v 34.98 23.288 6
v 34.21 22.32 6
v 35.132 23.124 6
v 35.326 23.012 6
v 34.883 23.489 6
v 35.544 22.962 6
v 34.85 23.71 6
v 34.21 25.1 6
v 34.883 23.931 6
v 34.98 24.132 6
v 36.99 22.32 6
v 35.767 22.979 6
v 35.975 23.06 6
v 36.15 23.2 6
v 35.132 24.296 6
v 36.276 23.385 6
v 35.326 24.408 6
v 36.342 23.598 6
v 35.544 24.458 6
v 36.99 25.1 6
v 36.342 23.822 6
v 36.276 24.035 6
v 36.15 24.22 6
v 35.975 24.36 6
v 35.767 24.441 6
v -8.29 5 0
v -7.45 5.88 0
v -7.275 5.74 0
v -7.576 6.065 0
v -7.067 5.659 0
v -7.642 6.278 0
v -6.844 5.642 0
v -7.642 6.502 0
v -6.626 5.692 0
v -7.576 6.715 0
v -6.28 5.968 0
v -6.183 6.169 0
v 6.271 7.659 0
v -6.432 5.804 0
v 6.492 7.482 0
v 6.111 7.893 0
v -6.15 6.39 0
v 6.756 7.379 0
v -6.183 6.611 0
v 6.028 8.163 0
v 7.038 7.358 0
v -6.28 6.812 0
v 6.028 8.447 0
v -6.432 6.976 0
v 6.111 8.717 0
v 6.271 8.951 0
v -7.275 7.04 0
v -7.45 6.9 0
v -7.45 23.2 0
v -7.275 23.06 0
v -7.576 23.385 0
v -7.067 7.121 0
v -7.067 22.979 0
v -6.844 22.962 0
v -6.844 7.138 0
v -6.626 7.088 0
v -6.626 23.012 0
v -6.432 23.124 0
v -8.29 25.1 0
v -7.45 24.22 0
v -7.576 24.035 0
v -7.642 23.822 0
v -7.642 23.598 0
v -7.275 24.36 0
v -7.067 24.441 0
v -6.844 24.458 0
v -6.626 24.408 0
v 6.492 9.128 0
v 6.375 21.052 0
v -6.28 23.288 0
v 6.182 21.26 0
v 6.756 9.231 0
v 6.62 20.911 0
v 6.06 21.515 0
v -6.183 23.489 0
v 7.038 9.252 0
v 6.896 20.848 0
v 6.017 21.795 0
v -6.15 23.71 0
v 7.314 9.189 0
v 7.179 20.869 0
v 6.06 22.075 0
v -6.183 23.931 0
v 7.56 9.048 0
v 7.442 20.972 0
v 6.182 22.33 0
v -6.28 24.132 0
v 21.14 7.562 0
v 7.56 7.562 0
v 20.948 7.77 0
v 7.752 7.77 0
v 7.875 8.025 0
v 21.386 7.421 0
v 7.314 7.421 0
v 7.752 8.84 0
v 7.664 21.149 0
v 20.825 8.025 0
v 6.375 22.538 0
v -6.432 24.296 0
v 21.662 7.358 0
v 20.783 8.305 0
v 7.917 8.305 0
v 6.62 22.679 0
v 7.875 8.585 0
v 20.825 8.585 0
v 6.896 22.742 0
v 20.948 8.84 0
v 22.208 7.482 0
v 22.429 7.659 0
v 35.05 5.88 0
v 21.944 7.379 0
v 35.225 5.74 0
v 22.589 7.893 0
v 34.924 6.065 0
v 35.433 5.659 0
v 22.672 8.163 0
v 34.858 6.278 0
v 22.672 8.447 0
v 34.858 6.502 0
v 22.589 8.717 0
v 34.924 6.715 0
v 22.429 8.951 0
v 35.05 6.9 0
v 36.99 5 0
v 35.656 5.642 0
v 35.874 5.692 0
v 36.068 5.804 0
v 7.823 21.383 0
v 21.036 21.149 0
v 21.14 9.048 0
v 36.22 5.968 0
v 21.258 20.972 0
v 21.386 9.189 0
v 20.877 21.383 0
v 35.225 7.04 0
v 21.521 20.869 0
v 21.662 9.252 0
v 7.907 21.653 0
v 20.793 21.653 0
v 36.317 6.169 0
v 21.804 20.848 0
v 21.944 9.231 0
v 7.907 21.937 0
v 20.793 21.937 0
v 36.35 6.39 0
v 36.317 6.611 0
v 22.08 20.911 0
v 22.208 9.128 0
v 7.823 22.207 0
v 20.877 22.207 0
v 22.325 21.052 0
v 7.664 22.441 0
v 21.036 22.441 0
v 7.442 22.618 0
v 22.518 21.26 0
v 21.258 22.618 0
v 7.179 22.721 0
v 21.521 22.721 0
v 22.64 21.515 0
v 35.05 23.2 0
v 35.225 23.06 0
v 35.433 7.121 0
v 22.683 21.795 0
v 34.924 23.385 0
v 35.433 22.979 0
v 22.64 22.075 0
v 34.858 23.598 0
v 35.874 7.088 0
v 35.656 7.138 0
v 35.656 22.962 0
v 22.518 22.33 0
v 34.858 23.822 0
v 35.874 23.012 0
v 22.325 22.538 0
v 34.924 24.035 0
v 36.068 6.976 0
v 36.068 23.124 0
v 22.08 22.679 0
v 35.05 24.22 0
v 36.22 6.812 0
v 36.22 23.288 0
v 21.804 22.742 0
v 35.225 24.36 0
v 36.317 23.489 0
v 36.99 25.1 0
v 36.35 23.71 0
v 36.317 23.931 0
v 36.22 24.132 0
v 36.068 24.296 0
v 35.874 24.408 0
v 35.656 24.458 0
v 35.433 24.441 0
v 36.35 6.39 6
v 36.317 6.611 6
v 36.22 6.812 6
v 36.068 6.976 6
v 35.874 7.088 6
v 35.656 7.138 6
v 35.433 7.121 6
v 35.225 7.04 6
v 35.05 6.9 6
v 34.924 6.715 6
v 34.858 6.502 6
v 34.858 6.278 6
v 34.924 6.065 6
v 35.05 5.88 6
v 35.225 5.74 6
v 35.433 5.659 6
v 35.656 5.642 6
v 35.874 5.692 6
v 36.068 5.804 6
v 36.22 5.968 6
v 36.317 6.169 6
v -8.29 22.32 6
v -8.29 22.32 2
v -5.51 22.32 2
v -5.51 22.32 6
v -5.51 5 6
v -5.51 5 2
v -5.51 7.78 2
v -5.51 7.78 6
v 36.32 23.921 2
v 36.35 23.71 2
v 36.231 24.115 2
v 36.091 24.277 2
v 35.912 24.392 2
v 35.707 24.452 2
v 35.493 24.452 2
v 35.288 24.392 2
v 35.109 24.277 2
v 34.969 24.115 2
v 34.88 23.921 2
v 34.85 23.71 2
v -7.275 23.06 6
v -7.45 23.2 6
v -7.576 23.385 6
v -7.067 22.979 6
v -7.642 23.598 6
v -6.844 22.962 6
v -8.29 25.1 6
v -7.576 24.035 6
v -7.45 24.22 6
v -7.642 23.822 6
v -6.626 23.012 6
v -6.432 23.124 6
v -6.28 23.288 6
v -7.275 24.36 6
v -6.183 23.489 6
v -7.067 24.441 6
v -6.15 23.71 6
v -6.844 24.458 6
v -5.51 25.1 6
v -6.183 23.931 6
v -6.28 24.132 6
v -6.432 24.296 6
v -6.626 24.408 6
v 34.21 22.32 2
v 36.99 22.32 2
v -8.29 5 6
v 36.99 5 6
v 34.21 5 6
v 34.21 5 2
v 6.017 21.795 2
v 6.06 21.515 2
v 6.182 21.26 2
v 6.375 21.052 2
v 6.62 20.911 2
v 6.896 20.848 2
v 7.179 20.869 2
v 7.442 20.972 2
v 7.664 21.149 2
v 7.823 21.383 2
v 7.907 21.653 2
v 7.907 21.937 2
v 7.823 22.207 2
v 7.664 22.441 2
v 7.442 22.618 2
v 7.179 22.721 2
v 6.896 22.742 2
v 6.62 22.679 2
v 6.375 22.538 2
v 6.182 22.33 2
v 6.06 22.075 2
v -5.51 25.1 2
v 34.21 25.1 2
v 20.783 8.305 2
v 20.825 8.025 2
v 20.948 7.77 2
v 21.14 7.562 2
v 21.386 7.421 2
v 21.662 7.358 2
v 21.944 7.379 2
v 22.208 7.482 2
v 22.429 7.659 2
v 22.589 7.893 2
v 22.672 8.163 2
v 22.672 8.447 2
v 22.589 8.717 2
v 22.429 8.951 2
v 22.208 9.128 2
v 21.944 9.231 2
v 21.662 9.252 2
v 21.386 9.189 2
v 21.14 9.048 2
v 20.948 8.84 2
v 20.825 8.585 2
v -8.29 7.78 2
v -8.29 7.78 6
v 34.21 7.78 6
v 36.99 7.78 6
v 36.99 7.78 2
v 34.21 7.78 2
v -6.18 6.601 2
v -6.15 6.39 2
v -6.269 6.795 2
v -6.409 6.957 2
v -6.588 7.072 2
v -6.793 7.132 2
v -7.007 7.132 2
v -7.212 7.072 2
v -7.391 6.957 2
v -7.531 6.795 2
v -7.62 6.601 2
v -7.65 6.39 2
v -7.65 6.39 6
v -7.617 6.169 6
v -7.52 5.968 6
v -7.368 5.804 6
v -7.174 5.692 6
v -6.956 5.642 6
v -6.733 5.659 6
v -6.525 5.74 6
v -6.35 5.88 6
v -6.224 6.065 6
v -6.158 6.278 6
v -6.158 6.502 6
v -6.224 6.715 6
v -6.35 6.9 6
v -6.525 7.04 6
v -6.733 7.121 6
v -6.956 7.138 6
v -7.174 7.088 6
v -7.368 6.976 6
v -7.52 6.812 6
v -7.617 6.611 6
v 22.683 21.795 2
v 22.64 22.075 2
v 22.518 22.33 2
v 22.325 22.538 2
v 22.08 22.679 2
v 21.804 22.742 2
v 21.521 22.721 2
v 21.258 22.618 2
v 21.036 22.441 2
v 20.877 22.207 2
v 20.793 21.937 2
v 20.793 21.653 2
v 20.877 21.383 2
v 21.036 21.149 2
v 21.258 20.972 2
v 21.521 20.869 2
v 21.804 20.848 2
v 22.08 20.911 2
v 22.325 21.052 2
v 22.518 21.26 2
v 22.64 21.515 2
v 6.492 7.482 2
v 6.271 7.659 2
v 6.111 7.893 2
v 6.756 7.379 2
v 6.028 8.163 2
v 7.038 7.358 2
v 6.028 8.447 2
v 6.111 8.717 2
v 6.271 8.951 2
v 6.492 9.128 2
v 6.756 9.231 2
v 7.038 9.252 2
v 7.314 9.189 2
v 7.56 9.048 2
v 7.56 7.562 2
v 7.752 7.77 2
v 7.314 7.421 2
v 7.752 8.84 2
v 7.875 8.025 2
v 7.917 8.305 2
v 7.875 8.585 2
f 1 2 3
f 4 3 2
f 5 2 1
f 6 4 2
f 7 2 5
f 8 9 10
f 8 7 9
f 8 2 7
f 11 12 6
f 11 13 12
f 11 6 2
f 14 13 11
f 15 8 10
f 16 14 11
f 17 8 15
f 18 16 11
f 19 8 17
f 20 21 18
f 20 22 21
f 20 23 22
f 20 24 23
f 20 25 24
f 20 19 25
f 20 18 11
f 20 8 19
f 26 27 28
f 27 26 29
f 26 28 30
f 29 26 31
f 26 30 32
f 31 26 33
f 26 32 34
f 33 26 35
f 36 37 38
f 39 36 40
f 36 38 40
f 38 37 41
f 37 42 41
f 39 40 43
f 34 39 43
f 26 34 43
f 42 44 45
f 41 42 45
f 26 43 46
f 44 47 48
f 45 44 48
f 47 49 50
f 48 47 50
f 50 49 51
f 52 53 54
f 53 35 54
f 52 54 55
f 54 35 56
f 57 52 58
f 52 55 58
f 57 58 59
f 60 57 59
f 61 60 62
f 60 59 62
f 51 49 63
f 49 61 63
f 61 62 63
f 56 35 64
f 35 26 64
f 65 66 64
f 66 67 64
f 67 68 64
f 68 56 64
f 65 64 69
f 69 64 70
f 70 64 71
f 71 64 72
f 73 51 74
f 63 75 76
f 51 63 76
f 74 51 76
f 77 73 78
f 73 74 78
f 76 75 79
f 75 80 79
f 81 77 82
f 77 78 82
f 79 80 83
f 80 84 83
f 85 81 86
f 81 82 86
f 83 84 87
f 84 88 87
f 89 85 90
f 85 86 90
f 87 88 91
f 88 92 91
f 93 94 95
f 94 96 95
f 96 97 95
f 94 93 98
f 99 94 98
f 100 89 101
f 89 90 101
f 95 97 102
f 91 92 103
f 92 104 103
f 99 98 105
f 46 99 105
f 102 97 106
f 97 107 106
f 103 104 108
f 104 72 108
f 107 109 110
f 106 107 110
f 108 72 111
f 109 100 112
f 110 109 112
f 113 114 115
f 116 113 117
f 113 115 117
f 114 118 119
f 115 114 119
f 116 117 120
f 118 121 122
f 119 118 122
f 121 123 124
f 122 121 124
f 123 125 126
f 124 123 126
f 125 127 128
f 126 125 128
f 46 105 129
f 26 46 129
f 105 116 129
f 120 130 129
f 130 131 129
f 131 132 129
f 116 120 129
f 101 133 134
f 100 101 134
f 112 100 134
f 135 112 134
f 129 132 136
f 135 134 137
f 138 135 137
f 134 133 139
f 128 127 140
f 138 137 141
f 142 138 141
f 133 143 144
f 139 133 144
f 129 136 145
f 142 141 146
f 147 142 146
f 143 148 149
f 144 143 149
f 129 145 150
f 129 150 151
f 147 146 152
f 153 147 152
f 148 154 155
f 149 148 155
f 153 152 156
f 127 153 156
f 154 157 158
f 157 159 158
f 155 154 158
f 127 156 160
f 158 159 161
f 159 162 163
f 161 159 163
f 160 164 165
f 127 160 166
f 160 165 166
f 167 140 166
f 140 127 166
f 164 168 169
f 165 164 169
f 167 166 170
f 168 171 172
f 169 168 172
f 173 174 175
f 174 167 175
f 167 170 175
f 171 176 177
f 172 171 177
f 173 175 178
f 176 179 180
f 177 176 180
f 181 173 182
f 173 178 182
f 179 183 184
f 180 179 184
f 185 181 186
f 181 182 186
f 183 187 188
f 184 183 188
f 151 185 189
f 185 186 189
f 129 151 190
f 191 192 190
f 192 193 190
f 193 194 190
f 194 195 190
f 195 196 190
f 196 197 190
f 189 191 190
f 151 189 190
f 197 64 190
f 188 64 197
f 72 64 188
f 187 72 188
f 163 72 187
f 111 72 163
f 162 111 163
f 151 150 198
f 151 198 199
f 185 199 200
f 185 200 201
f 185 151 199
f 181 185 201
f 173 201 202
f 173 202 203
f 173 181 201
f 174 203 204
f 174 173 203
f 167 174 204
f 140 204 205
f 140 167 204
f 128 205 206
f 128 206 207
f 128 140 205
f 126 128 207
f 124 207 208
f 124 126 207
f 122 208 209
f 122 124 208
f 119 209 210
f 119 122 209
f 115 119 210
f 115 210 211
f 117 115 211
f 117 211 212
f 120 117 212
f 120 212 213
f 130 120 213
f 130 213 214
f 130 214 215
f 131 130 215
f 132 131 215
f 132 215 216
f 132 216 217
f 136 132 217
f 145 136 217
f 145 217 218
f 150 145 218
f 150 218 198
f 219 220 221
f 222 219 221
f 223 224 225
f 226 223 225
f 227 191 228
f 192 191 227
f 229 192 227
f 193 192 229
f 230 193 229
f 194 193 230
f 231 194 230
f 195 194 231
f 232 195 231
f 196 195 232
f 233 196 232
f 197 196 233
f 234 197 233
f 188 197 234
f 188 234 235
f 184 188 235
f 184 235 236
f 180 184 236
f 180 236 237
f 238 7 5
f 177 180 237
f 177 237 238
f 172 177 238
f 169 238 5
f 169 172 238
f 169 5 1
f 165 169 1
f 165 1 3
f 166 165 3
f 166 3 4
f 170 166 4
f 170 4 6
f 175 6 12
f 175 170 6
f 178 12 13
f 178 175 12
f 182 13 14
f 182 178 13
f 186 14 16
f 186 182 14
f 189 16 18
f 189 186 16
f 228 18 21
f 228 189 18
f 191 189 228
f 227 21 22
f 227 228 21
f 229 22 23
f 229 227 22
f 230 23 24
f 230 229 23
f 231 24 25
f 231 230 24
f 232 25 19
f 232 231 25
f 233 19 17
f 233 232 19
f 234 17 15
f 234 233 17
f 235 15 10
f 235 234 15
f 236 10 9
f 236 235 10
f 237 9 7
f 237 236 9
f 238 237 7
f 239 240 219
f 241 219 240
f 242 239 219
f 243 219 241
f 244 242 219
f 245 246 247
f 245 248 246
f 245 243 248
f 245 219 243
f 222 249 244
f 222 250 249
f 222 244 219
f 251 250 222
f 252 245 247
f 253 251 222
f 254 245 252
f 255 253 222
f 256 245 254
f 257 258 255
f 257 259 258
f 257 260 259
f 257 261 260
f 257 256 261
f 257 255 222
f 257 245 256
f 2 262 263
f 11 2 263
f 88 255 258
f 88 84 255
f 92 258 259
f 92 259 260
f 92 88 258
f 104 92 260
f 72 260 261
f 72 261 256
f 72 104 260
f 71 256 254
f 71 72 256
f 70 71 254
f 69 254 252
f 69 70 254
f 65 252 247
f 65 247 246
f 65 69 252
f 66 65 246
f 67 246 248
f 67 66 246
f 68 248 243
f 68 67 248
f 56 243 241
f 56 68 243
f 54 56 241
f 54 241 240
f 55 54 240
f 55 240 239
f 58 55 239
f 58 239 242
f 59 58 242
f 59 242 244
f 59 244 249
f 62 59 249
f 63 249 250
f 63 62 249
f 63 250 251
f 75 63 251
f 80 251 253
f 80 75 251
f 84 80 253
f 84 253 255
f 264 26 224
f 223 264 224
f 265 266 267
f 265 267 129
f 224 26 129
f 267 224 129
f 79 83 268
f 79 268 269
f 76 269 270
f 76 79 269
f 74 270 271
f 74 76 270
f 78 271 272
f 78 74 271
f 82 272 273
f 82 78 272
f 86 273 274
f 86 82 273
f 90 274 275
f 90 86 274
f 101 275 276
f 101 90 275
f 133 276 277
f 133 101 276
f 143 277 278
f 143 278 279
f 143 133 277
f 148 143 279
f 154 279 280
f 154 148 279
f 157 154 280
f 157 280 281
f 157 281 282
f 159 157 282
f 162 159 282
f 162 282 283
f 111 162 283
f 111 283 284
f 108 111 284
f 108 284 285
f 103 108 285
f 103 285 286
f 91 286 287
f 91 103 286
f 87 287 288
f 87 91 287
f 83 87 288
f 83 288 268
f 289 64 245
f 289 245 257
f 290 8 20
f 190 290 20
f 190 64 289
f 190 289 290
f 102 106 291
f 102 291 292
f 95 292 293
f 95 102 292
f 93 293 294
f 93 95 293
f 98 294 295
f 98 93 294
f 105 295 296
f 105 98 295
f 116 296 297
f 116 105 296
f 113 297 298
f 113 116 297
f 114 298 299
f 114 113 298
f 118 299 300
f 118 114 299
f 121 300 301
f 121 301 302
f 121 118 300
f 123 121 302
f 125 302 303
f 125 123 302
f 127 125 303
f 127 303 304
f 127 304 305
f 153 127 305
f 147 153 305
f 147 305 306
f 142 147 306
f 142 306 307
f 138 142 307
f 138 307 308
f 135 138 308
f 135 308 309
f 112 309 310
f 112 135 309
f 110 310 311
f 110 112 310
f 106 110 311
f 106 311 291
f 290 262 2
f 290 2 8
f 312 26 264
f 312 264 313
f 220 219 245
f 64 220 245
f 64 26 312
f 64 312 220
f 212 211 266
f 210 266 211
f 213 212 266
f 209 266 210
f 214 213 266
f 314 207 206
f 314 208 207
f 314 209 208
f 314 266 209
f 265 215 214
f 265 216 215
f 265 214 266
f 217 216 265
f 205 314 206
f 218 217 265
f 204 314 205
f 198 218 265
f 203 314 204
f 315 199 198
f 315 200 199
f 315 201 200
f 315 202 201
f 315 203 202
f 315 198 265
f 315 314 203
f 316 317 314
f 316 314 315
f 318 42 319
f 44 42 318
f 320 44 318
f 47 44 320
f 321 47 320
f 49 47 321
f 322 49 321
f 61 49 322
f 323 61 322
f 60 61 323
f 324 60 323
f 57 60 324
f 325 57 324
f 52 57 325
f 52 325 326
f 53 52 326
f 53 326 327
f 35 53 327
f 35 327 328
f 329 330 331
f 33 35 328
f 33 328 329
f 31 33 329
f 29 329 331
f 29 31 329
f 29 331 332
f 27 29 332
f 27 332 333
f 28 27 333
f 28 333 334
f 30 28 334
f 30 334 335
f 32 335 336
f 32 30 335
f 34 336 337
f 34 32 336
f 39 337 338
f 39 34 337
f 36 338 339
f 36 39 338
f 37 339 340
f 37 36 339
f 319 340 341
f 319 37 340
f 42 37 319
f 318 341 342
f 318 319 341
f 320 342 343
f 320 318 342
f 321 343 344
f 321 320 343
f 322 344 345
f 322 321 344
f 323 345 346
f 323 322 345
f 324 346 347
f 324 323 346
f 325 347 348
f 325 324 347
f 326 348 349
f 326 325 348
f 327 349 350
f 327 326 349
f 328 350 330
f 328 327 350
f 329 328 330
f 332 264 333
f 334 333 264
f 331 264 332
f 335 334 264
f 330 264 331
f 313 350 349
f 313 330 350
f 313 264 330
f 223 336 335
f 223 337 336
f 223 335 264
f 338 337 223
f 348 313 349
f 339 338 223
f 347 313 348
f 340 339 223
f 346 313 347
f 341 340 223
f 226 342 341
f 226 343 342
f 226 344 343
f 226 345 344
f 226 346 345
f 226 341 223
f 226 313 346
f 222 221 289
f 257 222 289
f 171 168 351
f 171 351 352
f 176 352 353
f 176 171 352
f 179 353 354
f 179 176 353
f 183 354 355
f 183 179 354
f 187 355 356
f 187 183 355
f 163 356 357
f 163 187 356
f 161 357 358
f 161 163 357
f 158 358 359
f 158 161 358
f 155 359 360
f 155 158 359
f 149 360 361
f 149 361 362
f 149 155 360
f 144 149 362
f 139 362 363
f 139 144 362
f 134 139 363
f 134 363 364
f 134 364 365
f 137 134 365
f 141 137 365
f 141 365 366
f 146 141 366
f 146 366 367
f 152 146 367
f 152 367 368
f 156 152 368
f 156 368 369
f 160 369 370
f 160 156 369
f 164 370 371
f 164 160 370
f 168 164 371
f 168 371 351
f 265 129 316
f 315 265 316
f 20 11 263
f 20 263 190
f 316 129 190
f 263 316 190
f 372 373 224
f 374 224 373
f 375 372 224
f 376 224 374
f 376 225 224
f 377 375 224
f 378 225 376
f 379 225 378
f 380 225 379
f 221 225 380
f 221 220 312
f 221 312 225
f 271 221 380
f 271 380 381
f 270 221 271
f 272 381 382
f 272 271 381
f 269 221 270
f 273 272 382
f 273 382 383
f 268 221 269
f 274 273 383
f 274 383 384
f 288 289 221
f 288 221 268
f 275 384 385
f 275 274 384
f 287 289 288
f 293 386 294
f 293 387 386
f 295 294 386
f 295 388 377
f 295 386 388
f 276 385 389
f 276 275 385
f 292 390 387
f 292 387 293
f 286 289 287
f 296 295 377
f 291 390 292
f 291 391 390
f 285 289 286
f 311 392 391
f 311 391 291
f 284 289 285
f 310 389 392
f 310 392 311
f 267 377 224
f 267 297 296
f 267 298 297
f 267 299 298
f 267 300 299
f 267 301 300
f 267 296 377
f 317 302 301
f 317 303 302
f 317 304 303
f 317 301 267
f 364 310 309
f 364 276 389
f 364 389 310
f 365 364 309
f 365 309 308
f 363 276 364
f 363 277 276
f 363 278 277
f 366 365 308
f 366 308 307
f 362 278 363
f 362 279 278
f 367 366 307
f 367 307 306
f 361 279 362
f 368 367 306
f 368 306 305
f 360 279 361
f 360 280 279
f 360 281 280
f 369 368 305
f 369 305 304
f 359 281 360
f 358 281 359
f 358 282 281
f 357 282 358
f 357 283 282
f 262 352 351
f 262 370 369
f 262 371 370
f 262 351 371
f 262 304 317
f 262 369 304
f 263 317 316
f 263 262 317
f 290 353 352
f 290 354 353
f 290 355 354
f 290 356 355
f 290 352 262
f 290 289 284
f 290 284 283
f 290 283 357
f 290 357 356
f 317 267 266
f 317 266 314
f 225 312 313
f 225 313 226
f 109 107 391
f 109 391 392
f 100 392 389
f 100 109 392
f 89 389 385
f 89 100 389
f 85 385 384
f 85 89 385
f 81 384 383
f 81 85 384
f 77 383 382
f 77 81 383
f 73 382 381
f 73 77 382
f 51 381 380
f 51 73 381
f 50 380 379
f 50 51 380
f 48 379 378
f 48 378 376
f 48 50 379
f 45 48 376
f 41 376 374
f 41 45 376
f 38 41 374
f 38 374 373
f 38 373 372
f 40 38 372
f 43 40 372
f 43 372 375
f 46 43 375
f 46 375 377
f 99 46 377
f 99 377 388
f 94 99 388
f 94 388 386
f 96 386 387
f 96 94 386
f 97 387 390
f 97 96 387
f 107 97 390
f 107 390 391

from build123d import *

# Parameters (mm, degrees)
SKETCH2_R           = 0.95
SKETCH2_R_2         = 0.75
BOSS_EXTRUDE1_DEPTH = 2
SKETCH4_W           = 2.78
SKETCH4_H           = 2.78
SKETCH4_R           = 0.75
BOSS_EXTRUDE2_DEPTH = 4


with BuildPart() as part:
    # Sketch2 → Boss-Extrude1 (new body)
    with BuildSketch(Plane.XY):
        Polygon((36.99, 25.1), (-8.29, 25.1), (-8.29, 5), (3.35, 5), (25.35, 5), (36.99, 5), align=None)
        with Locations((6.967324962, 8.304919624)):
            Circle(SKETCH2_R, mode=Mode.SUBTRACT)
        with Locations(Location((6.967324962, 21.795080376, 0), (0, 0, 180))):
            Circle(SKETCH2_R, mode=Mode.SUBTRACT)
        with Locations(Location((21.732675038, 8.304919624, 0), (0, 0, 180))):
            Circle(SKETCH2_R, mode=Mode.SUBTRACT)
        with Locations((21.732675038, 21.795080376)):
            Circle(SKETCH2_R, mode=Mode.SUBTRACT)
        with Locations((35.6, 23.71)):
            Circle(SKETCH2_R_2, mode=Mode.SUBTRACT)
        with Locations((35.6, 6.39)):
            Circle(SKETCH2_R_2, mode=Mode.SUBTRACT)
        with Locations((-6.9, 6.39)):
            Circle(SKETCH2_R_2, mode=Mode.SUBTRACT)
        with Locations((-6.9, 23.71)):
            Circle(SKETCH2_R_2, mode=Mode.SUBTRACT)
    extrude(amount=BOSS_EXTRUDE1_DEPTH)

    # Sketch4 → Boss-Extrude2 (add)
    # profile 1 of 4: a face of its own
    with BuildSketch(Plane.XY.offset(2)):
        with Locations((-6.9, 23.71)):
            Rectangle(SKETCH4_W, SKETCH4_H)
        with Locations((-6.9, 23.71)):
            Circle(SKETCH4_R, mode=Mode.SUBTRACT)
    # profile 2 of 4: a face of its own
    with BuildSketch(Plane.XY.offset(2)):
        with Locations((35.6, 23.71)):
            Rectangle(SKETCH4_W, SKETCH4_H)
        with Locations(Location((35.6, 23.71, 0), (0, 0, 180))):
            Circle(SKETCH4_R, mode=Mode.SUBTRACT)
    # profile 3 of 4: a face of its own
    with BuildSketch(Plane.XY.offset(2)):
        with Locations((35.6, 6.39)):
            Rectangle(SKETCH4_W, SKETCH4_H)
        with Locations((35.6, 6.39)):
            Circle(SKETCH4_R, mode=Mode.SUBTRACT)
    # profile 4 of 4: a face of its own
    with BuildSketch(Plane.XY.offset(2)):
        with Locations((-6.9, 6.39)):
            Rectangle(SKETCH4_W, SKETCH4_H)
        with Locations(Location((-6.9, 6.39, 0), (0, 0, 180))):
            Circle(SKETCH4_R, mode=Mode.SUBTRACT)
    extrude(amount=BOSS_EXTRUDE2_DEPTH)


solid = part.part
